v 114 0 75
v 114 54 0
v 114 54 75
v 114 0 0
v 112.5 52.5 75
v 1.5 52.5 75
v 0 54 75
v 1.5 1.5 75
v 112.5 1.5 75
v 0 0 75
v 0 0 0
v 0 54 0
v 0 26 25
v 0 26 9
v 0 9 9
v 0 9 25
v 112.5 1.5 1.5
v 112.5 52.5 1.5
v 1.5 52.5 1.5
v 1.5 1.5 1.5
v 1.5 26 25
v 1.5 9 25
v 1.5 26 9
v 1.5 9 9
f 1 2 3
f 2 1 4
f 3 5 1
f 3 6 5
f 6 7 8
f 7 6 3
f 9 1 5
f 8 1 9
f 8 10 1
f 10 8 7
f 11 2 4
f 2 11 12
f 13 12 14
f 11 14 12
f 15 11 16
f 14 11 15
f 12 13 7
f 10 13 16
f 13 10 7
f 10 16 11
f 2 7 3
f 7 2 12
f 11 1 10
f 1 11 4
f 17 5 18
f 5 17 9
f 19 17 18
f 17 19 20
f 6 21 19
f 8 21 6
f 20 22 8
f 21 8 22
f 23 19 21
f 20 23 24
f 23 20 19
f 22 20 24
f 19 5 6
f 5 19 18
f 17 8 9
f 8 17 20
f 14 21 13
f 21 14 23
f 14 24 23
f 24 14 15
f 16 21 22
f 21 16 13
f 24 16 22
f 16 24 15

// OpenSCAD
/**
*  Powersupply End Cover for non vented power supply
*   Created for use with the power supply provided
*   with a 2017 Tevo Tarantula i3 3D printer where the PS
*   has no vents for air intake except at the terminal 
*   block end. The fan is mounted at the other end and
*   blows air out of the unit.
*  
*  Designed to stand on it's end.
*
*
*
*
**/



// Create variables for the size of the power supply
// include fudge factor for plastic contraction

psHeight = 51;
psWidth = 111;
psDepth = 75; // how 'tall' to make the cover
//switchHeight
//switchWidth

dcOutWidth=17;
dcOutHeight=16;

thickness=3;
/*===============Execute===================*/

// translate([0,(psHeight/2)]) 
cover();

/*===============Modules====================*/

module cover() {
    difference() {
        cube([psWidth + thickness, psHeight + thickness ,psDepth]);
        translate([thickness/2,thickness/2,thickness/2]) cube([psWidth,psHeight,psDepth]);
        dcHole();
    }
}

module dcHole() {
    translate([thickness+1,dcOutWidth+3*thickness, 3*thickness]) { 
        rotate([90,0,-90]) {
            cube([dcOutWidth,dcOutHeight,thickness+2]);
        }
    }
}
